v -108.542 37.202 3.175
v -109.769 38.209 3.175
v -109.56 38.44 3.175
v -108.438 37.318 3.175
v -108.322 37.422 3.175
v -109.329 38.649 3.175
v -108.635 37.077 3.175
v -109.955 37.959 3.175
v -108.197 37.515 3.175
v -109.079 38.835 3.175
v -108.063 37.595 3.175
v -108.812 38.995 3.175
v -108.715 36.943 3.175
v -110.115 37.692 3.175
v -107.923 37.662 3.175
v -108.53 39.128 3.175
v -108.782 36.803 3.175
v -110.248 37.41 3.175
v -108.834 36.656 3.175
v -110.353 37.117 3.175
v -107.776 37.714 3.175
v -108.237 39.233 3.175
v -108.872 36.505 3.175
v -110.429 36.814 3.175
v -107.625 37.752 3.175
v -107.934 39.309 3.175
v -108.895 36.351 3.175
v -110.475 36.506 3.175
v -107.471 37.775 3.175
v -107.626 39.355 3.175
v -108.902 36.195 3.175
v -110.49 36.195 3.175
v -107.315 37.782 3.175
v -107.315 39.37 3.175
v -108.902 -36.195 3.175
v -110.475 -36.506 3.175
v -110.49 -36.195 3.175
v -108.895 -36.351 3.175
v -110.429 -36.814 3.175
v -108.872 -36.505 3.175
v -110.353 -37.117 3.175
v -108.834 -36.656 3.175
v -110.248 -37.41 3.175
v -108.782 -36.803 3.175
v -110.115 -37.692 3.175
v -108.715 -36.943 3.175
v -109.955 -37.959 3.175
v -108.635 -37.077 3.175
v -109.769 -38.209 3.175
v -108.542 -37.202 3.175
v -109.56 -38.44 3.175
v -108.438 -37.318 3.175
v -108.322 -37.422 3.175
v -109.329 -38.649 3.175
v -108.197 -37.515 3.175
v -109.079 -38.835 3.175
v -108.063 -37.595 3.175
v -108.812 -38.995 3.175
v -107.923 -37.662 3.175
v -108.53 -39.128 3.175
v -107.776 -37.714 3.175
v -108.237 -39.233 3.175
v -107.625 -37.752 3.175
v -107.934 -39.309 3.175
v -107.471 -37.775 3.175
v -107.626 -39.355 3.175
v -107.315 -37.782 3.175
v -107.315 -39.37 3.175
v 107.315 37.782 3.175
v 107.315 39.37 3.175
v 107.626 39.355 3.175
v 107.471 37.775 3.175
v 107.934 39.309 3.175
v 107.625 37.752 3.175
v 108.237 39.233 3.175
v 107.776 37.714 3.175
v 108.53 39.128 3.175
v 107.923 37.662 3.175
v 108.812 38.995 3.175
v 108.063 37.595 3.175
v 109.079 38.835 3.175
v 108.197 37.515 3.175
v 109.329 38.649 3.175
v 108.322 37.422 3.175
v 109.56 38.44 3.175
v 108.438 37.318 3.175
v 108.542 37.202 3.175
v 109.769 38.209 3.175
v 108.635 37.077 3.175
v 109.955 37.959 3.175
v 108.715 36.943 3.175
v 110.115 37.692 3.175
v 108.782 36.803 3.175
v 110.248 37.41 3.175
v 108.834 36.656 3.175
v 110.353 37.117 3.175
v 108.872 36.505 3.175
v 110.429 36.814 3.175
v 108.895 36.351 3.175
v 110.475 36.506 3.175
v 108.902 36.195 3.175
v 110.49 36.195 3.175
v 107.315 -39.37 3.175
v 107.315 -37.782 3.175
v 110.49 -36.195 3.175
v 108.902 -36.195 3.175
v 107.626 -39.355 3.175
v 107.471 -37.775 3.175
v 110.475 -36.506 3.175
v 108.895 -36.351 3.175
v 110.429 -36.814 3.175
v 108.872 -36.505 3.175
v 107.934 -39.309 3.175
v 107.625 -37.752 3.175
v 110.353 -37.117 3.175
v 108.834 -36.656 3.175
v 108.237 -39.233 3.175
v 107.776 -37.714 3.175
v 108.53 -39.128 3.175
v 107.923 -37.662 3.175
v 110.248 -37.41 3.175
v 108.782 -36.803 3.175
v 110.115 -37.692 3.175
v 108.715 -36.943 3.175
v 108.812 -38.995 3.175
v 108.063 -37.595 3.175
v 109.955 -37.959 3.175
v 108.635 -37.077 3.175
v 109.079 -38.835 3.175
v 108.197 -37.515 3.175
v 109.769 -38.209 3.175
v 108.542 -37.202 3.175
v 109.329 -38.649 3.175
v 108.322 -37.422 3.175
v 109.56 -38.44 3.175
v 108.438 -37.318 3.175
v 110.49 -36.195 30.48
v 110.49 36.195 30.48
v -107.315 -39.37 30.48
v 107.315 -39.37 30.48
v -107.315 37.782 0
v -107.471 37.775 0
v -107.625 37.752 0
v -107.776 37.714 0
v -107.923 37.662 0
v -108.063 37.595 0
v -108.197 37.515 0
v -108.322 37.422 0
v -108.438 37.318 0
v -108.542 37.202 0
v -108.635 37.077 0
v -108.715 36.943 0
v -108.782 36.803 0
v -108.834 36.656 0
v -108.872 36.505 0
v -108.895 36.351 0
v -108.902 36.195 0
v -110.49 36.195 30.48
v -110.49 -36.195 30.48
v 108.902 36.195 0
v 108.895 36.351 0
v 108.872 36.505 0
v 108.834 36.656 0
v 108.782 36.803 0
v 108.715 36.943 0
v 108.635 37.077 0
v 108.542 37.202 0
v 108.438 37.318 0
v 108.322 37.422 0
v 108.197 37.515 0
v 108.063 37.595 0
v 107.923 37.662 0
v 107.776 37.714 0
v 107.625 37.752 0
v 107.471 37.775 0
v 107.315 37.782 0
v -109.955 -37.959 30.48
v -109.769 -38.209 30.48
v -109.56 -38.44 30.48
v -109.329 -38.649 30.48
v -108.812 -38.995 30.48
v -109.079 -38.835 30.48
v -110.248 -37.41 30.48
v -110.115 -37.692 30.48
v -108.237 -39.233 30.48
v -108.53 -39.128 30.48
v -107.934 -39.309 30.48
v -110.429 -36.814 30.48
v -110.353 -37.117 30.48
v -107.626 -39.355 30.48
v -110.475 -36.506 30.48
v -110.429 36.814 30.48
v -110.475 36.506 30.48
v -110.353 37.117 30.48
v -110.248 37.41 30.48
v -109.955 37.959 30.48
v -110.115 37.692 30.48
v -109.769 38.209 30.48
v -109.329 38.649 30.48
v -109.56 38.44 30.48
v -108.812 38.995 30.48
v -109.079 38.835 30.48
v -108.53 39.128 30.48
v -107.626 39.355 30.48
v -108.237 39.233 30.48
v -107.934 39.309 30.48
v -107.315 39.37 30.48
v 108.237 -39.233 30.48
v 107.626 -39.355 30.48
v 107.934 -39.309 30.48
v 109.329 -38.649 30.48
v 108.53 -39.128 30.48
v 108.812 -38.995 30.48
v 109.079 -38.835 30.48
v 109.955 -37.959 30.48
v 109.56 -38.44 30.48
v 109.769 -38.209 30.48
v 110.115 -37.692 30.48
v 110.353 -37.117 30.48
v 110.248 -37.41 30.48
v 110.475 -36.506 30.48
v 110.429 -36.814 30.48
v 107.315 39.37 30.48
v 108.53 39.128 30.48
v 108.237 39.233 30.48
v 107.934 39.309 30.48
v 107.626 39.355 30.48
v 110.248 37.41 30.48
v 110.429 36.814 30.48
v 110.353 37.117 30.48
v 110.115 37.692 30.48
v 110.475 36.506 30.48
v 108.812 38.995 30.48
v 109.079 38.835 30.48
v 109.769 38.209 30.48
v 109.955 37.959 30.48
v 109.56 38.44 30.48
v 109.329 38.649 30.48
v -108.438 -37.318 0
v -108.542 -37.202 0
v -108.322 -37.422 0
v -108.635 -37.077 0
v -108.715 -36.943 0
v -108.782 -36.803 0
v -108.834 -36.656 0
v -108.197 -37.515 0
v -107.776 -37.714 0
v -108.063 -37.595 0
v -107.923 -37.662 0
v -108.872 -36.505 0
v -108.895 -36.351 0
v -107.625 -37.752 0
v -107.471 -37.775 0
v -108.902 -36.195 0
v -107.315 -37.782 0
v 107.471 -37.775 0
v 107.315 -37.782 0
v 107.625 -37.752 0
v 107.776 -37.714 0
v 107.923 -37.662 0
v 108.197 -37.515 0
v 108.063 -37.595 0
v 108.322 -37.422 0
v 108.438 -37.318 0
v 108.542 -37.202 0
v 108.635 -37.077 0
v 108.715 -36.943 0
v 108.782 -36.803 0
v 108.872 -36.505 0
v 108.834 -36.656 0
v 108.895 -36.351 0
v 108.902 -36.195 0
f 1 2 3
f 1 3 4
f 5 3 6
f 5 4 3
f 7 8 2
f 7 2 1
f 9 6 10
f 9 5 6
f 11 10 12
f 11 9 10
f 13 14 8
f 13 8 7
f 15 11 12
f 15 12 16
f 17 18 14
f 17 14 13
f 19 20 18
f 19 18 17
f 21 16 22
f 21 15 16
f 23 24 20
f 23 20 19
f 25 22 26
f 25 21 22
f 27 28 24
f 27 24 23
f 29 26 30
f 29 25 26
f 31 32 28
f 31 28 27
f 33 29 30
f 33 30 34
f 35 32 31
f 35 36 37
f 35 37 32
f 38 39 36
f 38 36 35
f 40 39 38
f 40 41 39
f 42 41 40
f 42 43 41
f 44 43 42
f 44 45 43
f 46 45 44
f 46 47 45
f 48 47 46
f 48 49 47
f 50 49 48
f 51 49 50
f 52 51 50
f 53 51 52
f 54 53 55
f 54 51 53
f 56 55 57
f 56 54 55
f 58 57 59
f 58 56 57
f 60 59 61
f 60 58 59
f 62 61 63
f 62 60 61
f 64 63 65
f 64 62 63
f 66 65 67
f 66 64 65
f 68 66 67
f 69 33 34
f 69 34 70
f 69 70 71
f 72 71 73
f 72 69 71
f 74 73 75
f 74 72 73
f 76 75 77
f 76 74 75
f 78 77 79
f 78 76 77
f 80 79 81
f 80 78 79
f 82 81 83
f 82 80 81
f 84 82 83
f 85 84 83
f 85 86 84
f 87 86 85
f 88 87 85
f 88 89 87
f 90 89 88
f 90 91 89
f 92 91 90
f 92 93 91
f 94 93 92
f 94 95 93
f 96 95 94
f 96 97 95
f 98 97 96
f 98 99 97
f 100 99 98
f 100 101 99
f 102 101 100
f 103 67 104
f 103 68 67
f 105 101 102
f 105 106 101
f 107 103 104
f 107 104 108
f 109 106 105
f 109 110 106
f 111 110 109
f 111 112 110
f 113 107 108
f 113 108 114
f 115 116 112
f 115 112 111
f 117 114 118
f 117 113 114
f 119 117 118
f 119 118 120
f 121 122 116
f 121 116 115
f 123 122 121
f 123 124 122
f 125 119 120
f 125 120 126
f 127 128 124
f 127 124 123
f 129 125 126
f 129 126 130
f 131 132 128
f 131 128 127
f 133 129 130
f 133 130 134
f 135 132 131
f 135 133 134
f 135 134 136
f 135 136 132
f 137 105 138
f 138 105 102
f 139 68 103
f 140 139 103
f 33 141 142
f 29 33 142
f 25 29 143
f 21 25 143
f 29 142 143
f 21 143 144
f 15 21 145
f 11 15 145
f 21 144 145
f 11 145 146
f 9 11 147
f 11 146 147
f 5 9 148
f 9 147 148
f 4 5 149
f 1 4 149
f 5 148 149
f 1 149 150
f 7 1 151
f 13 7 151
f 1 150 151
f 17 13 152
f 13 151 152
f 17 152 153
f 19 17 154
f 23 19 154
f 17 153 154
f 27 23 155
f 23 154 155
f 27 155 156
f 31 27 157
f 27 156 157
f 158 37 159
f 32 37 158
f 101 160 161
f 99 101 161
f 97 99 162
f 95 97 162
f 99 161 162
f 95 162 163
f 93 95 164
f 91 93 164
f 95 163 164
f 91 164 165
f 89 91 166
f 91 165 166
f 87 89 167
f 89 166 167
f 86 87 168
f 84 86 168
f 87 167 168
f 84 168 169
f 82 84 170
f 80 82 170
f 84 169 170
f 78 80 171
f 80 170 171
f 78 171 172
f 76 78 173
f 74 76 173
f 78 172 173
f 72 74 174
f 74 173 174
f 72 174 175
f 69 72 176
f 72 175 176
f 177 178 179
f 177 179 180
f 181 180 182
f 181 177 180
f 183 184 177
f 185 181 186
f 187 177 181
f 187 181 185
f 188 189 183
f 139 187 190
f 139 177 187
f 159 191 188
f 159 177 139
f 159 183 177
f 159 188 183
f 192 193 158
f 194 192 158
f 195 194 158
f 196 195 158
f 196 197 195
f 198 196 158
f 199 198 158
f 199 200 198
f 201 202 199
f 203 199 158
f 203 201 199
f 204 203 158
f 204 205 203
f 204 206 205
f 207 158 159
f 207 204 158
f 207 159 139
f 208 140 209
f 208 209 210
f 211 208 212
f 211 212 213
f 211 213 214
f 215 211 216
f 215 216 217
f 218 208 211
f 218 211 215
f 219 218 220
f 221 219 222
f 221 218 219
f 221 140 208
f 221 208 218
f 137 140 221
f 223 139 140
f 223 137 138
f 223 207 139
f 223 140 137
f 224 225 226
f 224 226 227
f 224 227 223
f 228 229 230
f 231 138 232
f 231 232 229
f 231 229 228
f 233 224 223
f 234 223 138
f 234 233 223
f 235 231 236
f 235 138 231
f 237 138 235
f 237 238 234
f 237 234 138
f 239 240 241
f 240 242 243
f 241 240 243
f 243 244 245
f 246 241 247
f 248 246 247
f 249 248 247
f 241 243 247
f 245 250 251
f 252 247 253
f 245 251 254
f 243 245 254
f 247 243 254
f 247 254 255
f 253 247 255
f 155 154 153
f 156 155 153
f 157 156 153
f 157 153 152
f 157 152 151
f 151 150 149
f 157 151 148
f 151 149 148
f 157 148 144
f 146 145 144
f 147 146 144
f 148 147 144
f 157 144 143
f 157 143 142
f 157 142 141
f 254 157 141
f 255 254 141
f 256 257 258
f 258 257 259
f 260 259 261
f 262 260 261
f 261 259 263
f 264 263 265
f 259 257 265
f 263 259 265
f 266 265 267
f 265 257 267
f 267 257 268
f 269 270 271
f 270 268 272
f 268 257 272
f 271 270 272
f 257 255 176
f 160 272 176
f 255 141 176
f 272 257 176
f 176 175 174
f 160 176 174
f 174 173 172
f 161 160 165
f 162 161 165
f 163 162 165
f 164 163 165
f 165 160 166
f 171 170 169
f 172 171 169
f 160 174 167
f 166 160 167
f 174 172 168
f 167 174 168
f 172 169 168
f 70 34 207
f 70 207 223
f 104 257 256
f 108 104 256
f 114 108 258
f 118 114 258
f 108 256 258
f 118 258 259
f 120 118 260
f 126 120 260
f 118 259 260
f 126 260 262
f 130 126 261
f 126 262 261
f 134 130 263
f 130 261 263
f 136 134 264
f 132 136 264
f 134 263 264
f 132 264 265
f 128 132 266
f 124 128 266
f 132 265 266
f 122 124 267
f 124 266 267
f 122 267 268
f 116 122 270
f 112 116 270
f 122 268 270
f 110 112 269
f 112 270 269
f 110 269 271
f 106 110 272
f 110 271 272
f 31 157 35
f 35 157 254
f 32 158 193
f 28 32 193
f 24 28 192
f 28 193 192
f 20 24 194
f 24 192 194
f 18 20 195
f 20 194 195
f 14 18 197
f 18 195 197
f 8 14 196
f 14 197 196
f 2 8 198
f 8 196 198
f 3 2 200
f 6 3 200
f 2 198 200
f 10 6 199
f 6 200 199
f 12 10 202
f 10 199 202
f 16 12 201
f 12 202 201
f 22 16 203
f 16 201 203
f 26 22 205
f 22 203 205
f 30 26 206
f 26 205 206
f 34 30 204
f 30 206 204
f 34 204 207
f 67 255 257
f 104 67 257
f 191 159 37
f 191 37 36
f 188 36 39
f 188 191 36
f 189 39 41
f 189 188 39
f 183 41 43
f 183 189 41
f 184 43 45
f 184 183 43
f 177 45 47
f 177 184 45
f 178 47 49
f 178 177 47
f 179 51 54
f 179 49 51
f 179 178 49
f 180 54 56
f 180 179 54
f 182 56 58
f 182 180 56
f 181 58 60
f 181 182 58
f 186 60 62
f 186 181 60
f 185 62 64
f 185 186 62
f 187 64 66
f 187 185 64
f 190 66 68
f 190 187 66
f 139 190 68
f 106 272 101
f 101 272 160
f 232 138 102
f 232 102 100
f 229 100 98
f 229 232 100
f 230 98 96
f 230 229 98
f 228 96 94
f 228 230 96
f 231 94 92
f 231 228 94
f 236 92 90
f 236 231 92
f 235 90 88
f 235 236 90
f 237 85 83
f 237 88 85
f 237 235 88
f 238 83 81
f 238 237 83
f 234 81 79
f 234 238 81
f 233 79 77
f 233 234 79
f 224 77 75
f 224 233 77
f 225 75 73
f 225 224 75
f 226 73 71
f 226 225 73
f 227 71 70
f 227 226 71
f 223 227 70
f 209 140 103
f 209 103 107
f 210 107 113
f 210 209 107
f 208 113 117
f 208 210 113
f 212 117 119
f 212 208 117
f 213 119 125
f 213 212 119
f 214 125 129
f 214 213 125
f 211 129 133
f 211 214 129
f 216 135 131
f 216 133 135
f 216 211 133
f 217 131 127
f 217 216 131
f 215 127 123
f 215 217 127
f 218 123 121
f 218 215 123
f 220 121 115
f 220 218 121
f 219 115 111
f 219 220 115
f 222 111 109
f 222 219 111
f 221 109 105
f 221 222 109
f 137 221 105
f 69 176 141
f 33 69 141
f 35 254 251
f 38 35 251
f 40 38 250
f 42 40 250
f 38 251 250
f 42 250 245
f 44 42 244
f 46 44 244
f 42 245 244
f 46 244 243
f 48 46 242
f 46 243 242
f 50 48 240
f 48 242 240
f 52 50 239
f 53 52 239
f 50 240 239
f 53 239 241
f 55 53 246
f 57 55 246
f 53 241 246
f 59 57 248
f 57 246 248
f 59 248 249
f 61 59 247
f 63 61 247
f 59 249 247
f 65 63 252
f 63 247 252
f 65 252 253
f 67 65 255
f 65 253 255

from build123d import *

# Parameters (mm, degrees)
F0_W     = 220.98
F0_H     = 78.74
F1_DEPTH = 30.48
F2_R     = 3.175
F4_DEPTH = 3.175


with BuildPart() as f1:
    # F0 (on Top) → F1 (new body)
    with BuildSketch(Plane.XY):
        Rectangle(F0_W, F0_H)
    extrude(amount=F1_DEPTH)

    # F2
    f2_edges = [f1.edges().sort_by_distance(p)[0] for p in [
        (-110.49, -39.37, 15.24),
        (110.49, 39.37, 15.24),
        (110.49, -39.37, 15.24),
        (-110.49, 39.37, 15.24),
    ]]
    fillet(f2_edges, radius=F2_R)

    # F3 (on face) → F4 (cut)
    with BuildSketch(Plane(origin=(0, 0, 0), x_dir=(1, 0, 0), z_dir=(0, 0, -1))):
        with BuildLine():
            ThreePointArc((110.49, 36.195), (109.560064, 38.440064), (107.315, 39.37))
            Line((107.315, 39.37), (-107.315, 39.37))
            ThreePointArc((-107.315, 39.37), (-109.560064, 38.440064), (-110.49, 36.195))
            Line((-110.49, 36.195), (-110.49, -36.195))
            ThreePointArc((-110.49, -36.195), (-109.560064, -38.440064), (-107.315, -39.37))
            Line((-107.315, -39.37), (107.315, -39.37))
            ThreePointArc((107.315, -39.37), (109.560064, -38.440064), (110.49, -36.195))
            Line((110.49, -36.195), (110.49, 36.195))
        make_face()
        with BuildLine():
            ThreePointArc((107.315, 37.7825), (108.437532, 37.317532), (108.9025, 36.195))
            Line((108.9025, 36.195), (108.9025, -36.195))
            ThreePointArc((108.9025, -36.195), (108.437532, -37.317532), (107.315, -37.7825))
            Line((107.315, -37.7825), (-107.315, -37.7825))
            ThreePointArc((-107.315, -37.7825), (-108.437532, -37.317532), (-108.9025, -36.195))
            Line((-108.9025, -36.195), (-108.9025, 36.195))
            ThreePointArc((-108.9025, 36.195), (-108.437532, 37.317532), (-107.315, 37.7825))
            Line((-107.315, 37.7825), (107.315, 37.7825))
        make_face(mode=Mode.SUBTRACT)
    extrude(amount=-F4_DEPTH, mode=Mode.SUBTRACT)


solid = f1.part
